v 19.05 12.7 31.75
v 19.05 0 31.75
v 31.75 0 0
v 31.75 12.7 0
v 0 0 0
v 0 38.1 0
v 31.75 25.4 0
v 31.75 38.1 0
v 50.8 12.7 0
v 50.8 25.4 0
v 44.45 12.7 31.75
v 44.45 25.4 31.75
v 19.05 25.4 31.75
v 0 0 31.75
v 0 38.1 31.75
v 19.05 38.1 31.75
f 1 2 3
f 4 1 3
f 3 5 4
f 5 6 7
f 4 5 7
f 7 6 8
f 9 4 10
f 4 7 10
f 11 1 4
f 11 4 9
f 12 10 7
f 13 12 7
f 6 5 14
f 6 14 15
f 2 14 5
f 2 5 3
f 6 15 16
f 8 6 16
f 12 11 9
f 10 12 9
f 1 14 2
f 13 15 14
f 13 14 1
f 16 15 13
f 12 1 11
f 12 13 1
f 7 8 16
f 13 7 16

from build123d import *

# Parameters (mm, degrees)
F0_W     = 50.8
F0_H     = 38.1
F1_DEPTH = 31.75
F3_DEPTH = 12.7
F5_DEPTH = 12.7
F7_DEPTH = 25.4


with BuildPart() as f1:
    # F0 (on Top) → F1 (new body)
    with BuildSketch(Plane.XY):
        with Locations((25.4, 19.05)):
            Rectangle(F0_W, F0_H)
    extrude(amount=F1_DEPTH)

    # F2 (on face) → F3 (cut)
    with BuildSketch(Plane.XZ):
        Polygon((19.05, 31.75), (31.75, 0), (50.8, 0), (50.8, 31.75), align=None)
    extrude(amount=-F3_DEPTH, mode=Mode.SUBTRACT)

    # F4 (on face) → F5 (cut)
    with BuildSketch(Plane(origin=(0, 38.1, 0), x_dir=(-1, 0, 0), z_dir=(0, 1, 0))):
        Polygon((-50.8, 0), (-31.75, 0), (-19.05, 31.75), (-50.8, 31.75), align=None)
    extrude(amount=-F5_DEPTH, mode=Mode.SUBTRACT)

    # F6 (on face) → F7 (cut)
    with BuildSketch(Plane.XZ.offset(-12.7)):
        Polygon((44.45, 31.75), (50.8, 0), (50.8, 31.75), align=None)
    extrude(amount=-F7_DEPTH, mode=Mode.SUBTRACT)


solid = f1.part
